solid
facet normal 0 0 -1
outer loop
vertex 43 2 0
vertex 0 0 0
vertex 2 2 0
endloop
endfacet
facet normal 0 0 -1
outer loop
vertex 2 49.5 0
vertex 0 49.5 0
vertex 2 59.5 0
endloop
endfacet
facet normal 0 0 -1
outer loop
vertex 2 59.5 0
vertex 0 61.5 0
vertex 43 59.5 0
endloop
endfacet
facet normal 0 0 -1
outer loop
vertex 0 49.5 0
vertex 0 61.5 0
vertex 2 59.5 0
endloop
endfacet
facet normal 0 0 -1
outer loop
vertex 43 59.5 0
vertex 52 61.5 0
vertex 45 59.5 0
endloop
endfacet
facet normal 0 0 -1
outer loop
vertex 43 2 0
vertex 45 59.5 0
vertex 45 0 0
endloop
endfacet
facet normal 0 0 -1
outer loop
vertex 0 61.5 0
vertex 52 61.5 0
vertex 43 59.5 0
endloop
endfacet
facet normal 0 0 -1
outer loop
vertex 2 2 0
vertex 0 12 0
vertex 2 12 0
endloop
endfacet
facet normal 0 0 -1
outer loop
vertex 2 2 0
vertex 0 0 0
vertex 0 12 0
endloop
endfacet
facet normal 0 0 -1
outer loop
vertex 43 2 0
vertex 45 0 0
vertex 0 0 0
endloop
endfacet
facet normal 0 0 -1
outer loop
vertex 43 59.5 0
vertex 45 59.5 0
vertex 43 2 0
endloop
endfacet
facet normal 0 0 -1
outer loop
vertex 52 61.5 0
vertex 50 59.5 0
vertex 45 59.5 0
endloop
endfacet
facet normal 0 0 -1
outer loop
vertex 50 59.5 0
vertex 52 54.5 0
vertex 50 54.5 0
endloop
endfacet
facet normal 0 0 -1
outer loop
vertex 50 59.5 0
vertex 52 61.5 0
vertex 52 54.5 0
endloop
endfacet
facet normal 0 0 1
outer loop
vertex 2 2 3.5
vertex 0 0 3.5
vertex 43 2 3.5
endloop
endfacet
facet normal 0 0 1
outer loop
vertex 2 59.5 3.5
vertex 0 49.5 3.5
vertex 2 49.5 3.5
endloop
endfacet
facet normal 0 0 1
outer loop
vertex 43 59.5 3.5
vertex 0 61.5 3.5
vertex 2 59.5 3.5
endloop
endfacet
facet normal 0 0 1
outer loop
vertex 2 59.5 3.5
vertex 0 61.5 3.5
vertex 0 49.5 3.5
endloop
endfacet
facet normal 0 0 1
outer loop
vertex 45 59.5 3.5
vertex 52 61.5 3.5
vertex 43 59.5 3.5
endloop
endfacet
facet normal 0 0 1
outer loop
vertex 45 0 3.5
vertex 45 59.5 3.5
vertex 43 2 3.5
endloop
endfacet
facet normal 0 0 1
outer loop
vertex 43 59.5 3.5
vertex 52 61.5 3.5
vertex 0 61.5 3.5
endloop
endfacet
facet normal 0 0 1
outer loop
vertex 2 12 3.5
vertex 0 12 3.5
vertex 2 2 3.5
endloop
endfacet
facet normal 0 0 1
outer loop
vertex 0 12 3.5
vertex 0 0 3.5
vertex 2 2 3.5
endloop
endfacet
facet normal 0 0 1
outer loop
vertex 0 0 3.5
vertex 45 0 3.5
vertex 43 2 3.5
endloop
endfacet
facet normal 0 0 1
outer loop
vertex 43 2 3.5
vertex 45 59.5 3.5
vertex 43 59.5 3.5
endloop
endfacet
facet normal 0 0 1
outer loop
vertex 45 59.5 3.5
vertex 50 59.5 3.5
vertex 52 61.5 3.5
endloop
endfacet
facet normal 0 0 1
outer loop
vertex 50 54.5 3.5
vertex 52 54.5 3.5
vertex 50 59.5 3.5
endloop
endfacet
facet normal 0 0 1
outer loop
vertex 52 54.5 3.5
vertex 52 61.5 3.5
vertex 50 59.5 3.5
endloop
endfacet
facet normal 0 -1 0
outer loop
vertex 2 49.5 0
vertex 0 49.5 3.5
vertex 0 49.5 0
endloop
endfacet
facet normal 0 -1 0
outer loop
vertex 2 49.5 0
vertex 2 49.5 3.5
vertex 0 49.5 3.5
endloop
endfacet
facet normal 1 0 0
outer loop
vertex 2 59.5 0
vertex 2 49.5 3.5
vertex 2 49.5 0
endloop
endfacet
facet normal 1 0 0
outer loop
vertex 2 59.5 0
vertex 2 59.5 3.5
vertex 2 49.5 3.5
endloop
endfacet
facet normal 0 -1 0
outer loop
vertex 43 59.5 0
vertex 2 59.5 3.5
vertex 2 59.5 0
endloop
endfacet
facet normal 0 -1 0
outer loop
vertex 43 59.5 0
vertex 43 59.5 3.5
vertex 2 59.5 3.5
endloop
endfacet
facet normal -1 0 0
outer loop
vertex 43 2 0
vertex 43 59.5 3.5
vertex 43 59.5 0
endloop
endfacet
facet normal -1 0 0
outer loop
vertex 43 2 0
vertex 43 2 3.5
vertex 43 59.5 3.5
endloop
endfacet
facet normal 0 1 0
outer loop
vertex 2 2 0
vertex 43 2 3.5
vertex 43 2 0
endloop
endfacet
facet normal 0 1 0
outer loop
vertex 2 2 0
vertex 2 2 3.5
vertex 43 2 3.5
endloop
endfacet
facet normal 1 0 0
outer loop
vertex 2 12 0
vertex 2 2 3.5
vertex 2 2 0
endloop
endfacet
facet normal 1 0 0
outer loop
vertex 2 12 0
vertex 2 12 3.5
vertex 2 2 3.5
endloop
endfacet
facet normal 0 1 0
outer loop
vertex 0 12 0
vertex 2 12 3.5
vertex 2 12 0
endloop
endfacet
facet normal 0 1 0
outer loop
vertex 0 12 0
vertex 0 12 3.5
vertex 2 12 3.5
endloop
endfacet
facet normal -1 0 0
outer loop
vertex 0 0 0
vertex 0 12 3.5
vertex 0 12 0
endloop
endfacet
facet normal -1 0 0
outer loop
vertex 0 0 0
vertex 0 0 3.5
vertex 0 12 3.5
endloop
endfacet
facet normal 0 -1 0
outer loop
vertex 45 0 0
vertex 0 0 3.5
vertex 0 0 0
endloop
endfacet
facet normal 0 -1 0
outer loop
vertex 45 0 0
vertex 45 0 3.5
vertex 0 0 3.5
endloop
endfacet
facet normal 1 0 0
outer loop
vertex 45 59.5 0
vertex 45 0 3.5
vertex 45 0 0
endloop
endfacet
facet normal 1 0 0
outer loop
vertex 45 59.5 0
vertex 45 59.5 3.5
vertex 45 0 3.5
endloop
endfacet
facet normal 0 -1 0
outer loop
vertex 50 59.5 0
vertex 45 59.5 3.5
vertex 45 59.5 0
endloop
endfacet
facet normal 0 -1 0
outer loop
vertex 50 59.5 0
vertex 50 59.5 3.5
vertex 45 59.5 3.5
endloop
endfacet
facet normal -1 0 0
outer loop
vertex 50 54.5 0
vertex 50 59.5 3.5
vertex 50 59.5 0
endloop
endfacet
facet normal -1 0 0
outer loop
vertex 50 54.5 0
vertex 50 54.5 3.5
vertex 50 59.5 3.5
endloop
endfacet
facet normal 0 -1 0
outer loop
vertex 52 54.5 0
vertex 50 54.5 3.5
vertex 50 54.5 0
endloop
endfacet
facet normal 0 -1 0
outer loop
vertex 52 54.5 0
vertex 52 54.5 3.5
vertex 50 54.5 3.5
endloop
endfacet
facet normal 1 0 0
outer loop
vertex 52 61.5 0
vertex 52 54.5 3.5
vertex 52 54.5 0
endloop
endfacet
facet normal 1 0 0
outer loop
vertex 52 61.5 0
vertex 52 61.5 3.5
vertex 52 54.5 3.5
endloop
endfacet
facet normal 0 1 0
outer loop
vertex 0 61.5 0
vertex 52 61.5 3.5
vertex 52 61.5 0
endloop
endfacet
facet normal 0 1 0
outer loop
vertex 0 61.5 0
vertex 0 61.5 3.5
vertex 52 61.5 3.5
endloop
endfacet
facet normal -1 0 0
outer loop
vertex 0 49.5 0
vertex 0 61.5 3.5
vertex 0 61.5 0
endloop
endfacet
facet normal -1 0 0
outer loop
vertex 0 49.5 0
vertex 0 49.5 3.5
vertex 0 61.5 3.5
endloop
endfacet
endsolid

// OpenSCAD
//
// Power Strip Mount
// Copyright (C) 2023 Nils Weber
//
// Licensed under CC BY-NC-SA 4.0
//

////////////////////////////////////////////////////////////////////////////////

Height = 57.5;

Depth = 41;

Width = 3.5;

Thickness = 2;

Height_Clamps = 10;

Width_Mount = 5;

Height_Mount = 5;

All_Closed = false;

linear_extrude(Width)
union() {
	difference() {
		square([Depth + Thickness*2, Height + Thickness*2]);

		translate([Thickness, Thickness])
		square([Depth, Height]);

		if (!All_Closed) {
			translate([-Thickness/2, Height_Clamps+Thickness])
			square([Thickness*2, Height - Height_Clamps*2]);
		}
	}

	translate([Depth+Thickness*2, Height+Thickness - Height_Mount])
	difference() {
		square([Width_Mount + Thickness, Height_Mount + Thickness]);

		translate([-1,-1])
		square([Width_Mount+1, Height_Mount+1]);
	}
}
